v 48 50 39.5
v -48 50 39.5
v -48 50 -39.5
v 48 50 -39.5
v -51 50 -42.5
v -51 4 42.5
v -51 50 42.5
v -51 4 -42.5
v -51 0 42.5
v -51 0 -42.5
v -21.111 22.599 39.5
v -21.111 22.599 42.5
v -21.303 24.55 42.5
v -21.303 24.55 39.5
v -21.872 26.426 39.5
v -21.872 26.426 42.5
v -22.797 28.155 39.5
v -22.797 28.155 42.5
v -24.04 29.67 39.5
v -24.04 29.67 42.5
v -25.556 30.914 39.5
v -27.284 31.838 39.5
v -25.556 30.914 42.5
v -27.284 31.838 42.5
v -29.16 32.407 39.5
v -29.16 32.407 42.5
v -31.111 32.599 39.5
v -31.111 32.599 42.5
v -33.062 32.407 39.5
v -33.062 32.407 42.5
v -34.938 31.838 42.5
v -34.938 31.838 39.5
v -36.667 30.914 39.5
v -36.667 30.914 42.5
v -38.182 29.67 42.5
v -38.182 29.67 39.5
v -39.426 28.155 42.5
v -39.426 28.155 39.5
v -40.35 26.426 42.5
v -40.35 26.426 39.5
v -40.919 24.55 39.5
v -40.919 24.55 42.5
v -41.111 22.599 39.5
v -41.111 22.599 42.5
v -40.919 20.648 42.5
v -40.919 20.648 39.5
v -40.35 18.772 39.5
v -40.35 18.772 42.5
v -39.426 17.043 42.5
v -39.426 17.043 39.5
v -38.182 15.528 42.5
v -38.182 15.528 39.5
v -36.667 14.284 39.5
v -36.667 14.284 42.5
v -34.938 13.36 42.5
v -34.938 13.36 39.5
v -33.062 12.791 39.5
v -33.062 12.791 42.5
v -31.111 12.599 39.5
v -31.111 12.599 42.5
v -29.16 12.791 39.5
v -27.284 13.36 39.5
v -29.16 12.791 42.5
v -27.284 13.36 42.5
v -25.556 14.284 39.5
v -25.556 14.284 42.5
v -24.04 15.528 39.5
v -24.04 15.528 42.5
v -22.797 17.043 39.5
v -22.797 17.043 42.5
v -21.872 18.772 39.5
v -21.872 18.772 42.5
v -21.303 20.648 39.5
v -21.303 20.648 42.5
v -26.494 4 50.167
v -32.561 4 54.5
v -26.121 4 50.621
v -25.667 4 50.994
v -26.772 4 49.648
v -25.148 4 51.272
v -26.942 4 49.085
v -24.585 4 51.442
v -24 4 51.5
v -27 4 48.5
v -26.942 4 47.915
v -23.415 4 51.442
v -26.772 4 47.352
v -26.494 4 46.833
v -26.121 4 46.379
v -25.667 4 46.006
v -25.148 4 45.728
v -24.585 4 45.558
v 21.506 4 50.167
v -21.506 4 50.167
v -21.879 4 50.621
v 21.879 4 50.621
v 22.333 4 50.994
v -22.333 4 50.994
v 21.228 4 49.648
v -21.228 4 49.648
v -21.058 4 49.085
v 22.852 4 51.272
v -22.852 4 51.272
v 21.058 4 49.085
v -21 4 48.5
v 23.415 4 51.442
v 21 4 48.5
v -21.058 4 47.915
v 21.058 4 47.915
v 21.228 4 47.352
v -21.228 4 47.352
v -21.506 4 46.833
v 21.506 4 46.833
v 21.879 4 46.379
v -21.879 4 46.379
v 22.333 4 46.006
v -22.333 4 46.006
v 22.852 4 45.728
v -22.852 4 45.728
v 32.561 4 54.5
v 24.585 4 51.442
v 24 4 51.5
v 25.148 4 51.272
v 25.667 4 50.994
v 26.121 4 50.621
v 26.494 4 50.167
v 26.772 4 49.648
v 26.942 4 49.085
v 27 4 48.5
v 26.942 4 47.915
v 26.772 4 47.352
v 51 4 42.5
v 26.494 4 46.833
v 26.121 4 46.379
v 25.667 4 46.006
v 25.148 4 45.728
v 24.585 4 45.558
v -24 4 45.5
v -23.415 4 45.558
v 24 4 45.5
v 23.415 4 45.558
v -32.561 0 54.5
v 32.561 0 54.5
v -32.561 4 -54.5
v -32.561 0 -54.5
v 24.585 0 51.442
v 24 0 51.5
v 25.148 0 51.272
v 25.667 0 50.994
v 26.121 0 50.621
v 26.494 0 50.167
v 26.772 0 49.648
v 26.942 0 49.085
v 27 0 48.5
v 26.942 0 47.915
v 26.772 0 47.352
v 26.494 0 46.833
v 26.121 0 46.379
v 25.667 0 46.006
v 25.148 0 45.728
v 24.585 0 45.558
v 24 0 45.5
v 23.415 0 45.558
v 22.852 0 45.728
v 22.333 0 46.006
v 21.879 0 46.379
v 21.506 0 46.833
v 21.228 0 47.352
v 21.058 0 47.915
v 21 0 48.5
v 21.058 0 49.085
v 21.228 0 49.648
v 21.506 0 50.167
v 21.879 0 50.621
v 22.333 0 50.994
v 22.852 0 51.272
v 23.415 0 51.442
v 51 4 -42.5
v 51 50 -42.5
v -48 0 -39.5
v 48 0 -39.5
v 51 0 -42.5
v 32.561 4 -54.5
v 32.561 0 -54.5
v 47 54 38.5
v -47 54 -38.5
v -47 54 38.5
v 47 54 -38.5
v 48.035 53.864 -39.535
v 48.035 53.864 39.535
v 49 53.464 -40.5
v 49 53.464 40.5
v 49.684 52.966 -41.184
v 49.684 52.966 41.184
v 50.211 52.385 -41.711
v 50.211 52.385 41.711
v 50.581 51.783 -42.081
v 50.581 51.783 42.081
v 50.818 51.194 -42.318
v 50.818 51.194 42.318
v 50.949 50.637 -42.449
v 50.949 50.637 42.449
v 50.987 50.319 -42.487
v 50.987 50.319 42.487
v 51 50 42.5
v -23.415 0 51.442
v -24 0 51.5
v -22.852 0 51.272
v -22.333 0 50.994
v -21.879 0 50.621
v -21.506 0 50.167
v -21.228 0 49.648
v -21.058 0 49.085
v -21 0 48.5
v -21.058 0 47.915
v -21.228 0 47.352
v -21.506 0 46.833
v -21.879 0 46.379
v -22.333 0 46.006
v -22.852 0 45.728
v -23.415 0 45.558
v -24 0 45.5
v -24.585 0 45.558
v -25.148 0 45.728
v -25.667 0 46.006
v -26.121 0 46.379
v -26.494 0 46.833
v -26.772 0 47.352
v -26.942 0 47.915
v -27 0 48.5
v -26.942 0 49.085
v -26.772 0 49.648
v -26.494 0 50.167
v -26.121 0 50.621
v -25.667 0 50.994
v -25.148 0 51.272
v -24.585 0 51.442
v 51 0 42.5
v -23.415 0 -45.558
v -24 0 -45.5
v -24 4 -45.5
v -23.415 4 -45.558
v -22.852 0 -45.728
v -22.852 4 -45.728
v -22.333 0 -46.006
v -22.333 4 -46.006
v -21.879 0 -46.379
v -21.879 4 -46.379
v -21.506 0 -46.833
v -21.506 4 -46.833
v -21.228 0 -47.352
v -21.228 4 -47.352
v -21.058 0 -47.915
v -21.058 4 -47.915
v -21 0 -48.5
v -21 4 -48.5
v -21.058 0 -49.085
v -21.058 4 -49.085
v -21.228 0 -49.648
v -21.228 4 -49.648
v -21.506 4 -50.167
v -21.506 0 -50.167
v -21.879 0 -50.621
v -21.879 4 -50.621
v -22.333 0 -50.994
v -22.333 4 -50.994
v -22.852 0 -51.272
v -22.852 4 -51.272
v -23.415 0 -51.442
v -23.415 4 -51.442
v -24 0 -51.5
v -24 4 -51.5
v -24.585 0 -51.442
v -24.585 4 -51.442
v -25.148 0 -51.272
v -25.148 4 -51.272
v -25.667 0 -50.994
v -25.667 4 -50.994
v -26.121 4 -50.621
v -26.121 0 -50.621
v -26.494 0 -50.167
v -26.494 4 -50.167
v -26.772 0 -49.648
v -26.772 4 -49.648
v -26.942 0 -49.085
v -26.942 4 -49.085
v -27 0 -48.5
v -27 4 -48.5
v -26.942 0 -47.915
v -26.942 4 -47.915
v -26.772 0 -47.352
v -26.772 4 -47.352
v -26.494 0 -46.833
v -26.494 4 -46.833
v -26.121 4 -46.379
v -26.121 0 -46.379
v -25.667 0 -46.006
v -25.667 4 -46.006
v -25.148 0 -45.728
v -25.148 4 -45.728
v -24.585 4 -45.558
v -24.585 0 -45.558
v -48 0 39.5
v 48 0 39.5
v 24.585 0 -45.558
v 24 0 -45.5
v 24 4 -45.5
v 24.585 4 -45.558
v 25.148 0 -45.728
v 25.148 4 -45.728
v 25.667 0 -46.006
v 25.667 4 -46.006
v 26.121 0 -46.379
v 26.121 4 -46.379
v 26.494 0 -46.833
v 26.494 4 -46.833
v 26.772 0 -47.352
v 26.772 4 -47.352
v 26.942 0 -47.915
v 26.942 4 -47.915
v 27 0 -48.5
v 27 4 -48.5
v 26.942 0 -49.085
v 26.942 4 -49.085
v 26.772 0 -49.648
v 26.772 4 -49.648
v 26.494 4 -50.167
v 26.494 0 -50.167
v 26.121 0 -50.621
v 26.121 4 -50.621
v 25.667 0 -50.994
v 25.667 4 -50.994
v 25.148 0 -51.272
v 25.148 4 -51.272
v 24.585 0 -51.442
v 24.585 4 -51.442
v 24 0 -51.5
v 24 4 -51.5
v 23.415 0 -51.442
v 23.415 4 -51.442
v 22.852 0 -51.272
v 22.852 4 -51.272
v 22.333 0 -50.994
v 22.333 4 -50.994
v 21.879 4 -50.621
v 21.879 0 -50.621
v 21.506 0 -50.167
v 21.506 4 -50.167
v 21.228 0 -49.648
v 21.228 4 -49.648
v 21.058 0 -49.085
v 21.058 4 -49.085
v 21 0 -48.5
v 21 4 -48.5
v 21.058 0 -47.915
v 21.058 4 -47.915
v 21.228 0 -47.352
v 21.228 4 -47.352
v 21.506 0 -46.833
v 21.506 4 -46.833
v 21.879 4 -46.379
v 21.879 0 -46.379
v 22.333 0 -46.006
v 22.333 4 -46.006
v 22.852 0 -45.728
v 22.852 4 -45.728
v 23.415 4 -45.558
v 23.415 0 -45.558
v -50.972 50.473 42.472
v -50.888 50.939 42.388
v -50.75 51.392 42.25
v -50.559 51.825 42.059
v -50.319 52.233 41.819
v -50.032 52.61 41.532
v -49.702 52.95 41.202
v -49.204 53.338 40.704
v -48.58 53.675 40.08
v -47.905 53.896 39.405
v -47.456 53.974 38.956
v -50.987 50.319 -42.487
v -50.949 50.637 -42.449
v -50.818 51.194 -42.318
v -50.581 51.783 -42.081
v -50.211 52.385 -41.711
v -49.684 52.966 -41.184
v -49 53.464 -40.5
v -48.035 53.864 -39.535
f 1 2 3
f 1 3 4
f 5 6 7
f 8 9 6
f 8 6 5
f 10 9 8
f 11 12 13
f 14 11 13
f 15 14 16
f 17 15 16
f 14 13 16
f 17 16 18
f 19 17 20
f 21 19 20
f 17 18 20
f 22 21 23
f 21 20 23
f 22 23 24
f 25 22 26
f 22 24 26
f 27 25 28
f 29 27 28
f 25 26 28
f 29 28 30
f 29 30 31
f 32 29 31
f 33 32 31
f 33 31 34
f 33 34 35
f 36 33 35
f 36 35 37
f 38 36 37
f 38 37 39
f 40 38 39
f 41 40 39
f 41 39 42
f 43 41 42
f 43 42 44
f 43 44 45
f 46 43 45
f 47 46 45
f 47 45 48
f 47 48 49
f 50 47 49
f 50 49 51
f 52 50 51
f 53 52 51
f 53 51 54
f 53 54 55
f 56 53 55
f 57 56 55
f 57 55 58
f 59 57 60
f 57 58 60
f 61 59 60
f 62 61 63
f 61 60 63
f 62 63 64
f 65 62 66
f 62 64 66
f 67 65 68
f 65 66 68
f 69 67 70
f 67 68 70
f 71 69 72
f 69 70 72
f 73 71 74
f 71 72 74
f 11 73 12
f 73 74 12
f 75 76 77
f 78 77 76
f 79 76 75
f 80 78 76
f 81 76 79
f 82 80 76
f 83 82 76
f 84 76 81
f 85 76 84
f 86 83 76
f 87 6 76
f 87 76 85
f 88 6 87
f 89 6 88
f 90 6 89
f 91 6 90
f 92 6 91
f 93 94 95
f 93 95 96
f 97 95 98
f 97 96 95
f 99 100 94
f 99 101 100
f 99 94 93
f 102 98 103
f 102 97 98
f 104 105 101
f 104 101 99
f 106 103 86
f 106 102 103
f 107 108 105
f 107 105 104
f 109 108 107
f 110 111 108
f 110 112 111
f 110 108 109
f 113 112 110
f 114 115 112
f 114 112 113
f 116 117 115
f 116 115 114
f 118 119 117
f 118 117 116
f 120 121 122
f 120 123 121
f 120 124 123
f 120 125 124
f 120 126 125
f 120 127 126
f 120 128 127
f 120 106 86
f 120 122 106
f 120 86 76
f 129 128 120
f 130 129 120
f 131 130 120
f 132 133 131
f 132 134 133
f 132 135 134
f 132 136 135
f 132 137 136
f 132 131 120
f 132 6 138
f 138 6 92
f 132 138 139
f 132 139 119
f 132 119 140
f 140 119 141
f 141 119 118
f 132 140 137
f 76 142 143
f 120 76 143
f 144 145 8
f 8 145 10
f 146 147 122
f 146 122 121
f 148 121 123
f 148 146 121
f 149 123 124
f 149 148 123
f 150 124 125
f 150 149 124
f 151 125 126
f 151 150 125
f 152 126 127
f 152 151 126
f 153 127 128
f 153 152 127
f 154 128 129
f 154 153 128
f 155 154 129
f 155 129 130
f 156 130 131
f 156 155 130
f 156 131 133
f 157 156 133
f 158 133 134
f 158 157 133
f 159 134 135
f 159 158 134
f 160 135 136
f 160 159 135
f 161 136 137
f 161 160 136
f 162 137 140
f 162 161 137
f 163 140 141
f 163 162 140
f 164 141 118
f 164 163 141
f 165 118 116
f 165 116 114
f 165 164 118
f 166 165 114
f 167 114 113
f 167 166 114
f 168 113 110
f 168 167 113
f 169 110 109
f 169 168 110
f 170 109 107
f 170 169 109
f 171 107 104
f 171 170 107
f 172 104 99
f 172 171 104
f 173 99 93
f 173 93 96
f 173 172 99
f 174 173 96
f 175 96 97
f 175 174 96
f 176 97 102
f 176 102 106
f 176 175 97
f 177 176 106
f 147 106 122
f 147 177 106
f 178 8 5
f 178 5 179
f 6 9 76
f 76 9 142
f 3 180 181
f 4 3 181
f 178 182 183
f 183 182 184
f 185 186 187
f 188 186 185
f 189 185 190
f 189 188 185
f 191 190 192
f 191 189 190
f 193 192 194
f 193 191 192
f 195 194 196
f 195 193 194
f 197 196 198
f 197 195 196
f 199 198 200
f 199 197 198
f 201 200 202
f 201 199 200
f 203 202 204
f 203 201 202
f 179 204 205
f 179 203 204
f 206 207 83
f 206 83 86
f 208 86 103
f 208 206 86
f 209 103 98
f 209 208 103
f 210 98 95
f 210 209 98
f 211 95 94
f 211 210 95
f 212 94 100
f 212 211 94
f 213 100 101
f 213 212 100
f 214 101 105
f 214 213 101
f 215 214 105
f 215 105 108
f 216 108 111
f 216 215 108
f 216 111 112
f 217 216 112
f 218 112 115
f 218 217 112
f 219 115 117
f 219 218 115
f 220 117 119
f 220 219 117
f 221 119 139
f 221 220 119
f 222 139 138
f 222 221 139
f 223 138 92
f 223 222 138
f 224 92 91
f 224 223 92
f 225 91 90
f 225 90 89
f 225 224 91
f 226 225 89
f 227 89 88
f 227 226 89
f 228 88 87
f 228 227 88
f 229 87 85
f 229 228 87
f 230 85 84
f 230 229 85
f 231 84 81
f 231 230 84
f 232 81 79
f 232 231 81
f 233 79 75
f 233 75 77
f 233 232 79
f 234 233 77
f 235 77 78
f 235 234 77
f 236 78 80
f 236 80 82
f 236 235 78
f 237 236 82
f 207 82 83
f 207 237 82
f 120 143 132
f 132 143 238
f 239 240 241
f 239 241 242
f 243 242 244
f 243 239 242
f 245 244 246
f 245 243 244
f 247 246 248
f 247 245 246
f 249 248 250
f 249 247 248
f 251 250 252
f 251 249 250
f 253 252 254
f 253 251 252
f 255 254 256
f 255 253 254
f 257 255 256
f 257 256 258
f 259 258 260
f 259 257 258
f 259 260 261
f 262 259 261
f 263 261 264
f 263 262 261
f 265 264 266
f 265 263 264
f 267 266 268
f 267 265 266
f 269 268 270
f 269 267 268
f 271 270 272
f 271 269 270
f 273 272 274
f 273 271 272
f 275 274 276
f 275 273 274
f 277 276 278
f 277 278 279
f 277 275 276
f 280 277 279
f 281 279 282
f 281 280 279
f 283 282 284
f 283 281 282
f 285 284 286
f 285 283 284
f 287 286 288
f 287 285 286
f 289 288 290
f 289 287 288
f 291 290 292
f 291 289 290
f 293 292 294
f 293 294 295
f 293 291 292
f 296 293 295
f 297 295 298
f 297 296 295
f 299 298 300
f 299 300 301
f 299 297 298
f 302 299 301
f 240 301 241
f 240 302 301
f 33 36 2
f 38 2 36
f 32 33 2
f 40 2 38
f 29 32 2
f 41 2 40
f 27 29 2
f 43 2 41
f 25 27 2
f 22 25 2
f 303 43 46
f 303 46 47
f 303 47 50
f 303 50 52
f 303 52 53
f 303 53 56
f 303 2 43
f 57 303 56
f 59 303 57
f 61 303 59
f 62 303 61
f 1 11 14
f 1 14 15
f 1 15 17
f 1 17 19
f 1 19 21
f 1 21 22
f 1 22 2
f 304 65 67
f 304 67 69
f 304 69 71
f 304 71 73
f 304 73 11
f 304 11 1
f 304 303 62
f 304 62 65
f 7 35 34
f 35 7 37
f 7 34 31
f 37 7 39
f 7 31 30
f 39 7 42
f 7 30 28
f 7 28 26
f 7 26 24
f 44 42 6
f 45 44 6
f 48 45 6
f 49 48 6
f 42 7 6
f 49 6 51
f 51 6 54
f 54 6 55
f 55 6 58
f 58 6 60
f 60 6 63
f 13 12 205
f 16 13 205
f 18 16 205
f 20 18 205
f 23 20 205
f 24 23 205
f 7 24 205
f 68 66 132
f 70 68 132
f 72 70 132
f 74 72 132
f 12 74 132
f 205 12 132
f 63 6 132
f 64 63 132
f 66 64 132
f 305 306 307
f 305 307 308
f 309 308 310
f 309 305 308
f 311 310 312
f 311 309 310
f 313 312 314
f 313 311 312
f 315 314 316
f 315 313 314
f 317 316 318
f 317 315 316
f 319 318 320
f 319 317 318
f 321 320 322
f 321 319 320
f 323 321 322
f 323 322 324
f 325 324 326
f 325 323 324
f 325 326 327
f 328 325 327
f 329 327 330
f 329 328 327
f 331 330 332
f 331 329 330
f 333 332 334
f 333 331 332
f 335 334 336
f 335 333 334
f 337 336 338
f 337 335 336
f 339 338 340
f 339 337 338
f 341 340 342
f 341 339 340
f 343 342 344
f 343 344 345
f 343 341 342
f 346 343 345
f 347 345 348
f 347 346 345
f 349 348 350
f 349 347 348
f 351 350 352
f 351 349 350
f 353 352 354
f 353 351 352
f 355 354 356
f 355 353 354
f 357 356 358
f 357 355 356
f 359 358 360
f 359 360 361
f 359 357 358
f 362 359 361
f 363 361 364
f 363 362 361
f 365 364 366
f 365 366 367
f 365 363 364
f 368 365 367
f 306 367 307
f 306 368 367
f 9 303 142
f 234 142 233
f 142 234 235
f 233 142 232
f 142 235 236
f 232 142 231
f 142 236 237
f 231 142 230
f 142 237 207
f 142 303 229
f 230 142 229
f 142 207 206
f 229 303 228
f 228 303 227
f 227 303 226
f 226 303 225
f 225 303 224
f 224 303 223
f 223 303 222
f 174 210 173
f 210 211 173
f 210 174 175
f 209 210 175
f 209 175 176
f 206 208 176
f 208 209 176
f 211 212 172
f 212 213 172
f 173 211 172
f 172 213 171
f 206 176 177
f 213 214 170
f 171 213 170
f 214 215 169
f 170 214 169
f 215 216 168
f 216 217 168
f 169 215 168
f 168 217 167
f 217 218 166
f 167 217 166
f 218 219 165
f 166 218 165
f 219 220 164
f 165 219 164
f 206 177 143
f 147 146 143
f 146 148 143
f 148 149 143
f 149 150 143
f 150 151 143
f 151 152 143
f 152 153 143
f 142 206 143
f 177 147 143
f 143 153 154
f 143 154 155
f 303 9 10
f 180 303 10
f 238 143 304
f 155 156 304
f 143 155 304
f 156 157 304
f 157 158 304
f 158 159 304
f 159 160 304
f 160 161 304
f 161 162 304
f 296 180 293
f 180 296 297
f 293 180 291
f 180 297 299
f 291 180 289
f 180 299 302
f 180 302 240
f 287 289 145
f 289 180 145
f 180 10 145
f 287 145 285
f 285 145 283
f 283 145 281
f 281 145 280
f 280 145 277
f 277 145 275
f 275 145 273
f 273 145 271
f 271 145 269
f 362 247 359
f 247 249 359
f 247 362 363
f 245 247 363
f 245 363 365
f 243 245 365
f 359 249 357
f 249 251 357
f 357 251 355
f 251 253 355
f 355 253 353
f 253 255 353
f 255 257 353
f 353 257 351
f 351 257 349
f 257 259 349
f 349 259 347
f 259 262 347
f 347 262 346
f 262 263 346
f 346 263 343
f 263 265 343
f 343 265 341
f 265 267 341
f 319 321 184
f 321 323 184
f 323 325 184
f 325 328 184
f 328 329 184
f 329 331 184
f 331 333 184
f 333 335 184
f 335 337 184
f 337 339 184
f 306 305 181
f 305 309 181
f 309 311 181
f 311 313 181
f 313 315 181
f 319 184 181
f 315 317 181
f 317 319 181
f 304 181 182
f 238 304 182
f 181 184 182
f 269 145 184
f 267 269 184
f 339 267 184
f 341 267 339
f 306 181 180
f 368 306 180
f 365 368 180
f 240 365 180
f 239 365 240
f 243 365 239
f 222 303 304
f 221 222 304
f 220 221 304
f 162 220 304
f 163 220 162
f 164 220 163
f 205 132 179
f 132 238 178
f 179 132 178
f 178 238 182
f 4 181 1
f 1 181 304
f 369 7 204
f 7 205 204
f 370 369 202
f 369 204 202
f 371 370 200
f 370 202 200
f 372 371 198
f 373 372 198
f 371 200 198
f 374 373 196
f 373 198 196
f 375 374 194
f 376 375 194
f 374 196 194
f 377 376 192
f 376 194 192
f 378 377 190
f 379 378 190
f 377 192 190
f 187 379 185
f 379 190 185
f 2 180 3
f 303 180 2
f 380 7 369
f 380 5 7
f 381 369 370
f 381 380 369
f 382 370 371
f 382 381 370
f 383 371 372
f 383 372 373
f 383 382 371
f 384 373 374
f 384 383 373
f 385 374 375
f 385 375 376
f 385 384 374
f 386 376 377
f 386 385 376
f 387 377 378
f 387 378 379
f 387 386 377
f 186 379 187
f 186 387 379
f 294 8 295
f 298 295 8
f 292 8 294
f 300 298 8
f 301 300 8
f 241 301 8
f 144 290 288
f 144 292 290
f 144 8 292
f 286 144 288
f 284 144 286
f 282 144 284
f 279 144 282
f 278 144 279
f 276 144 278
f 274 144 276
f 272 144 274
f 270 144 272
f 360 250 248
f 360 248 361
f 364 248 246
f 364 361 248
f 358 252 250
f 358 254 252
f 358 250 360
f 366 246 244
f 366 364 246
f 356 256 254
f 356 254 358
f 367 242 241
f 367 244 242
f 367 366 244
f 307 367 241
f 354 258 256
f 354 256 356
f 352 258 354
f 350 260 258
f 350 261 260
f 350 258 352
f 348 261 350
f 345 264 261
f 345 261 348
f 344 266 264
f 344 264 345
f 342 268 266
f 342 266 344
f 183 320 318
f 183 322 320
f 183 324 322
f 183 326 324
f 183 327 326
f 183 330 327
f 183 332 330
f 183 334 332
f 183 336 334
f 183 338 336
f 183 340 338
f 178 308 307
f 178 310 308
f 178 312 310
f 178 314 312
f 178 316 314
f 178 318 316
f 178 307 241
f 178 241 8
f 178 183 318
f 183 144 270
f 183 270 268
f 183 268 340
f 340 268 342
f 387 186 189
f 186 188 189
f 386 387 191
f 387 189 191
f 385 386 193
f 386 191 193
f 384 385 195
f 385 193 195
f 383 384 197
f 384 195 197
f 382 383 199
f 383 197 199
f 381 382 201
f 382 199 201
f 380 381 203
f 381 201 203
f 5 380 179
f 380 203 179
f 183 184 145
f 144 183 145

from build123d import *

# Parameters (mm, degrees)
SKETCH_1_R          = 3
EXTRUDE_1_DEPTH     = 4
SKETCH_2_W          = 102
SKETCH_2_H          = 85
EXTRUDE_2_DEPTH     = 50
SKETCH_4_W          = 96
SKETCH_4_H          = 79
CUT_EXTRUDE_3_DEPTH = 50
FILLET_1_R          = 4
CUT_EXTRUDE_4_REACH = 124.172
SKETCH_5_R          = 10


with BuildPart() as part:
    # 草图1 → 凸台-拉伸1 (new body)
    with BuildSketch(Plane(origin=(0, 0, 0), x_dir=(1, 0, 0), z_dir=(0, 1, 0))):
        Polygon((51, -42.5), (51, 42.5), (32.560911085, 54.5), (-32.560911085, 54.5), (-51, 42.5), (-51, -42.5), (-32.560911085, -54.5), (32.560911085, -54.5), align=None)
        with Locations(Location((-24, 48.5, 0), (0, 0, 270))):
            Circle(SKETCH_1_R, mode=Mode.SUBTRACT)
        with Locations(Location((24, 48.5, 0), (0, 0, 270))):
            Circle(SKETCH_1_R, mode=Mode.SUBTRACT)
        with Locations(Location((24, -48.5, 0), (0, 0, 270))):
            Circle(SKETCH_1_R, mode=Mode.SUBTRACT)
        with Locations(Location((-24, -48.5, 0), (0, 0, 270))):
            Circle(SKETCH_1_R, mode=Mode.SUBTRACT)
    extrude(amount=EXTRUDE_1_DEPTH)

    # 草图2 → 凸台-拉伸2 (add)
    with BuildSketch(Plane(origin=(0, 4, 0), x_dir=(1, 0, 0), z_dir=(0, 1, 0))):
        Rectangle(SKETCH_2_W, SKETCH_2_H)
    extrude(amount=EXTRUDE_2_DEPTH)

    # 草图4 → 切除-拉伸3 (cut)
    with BuildSketch(Plane.XZ):
        Rectangle(SKETCH_4_W, SKETCH_4_H)
    extrude(amount=-CUT_EXTRUDE_3_DEPTH, mode=Mode.SUBTRACT)

    # 圆角1
    fillet_1_edges = [part.edges().sort_by_distance(p)[0] for p in [
        (51, 54, 0),
        (0, 54, -42.5),
        (-51, 54, 0),
        (0, 54, 42.5),
    ]]
    fillet(fillet_1_edges, radius=FILLET_1_R)

    # 草图5 → 切除-拉伸4 (cut, up to next)
    with BuildSketch(Plane.XY.offset(42.5), mode=Mode.PRIVATE) as cut_extrude_4_sk1:
        with Locations((-31.111235747, 22.5989242)):
            Circle(SKETCH_5_R)
    cut_extrude_4_tool1 = extrude(cut_extrude_4_sk1.sketch, amount=-CUT_EXTRUDE_4_REACH, mode=Mode.PRIVATE) & part.part
    add(cut_extrude_4_tool1.solids().sort_by_distance((-31.111236, 22.598924, 42.5))[0], mode=Mode.SUBTRACT)


solid = part.part
